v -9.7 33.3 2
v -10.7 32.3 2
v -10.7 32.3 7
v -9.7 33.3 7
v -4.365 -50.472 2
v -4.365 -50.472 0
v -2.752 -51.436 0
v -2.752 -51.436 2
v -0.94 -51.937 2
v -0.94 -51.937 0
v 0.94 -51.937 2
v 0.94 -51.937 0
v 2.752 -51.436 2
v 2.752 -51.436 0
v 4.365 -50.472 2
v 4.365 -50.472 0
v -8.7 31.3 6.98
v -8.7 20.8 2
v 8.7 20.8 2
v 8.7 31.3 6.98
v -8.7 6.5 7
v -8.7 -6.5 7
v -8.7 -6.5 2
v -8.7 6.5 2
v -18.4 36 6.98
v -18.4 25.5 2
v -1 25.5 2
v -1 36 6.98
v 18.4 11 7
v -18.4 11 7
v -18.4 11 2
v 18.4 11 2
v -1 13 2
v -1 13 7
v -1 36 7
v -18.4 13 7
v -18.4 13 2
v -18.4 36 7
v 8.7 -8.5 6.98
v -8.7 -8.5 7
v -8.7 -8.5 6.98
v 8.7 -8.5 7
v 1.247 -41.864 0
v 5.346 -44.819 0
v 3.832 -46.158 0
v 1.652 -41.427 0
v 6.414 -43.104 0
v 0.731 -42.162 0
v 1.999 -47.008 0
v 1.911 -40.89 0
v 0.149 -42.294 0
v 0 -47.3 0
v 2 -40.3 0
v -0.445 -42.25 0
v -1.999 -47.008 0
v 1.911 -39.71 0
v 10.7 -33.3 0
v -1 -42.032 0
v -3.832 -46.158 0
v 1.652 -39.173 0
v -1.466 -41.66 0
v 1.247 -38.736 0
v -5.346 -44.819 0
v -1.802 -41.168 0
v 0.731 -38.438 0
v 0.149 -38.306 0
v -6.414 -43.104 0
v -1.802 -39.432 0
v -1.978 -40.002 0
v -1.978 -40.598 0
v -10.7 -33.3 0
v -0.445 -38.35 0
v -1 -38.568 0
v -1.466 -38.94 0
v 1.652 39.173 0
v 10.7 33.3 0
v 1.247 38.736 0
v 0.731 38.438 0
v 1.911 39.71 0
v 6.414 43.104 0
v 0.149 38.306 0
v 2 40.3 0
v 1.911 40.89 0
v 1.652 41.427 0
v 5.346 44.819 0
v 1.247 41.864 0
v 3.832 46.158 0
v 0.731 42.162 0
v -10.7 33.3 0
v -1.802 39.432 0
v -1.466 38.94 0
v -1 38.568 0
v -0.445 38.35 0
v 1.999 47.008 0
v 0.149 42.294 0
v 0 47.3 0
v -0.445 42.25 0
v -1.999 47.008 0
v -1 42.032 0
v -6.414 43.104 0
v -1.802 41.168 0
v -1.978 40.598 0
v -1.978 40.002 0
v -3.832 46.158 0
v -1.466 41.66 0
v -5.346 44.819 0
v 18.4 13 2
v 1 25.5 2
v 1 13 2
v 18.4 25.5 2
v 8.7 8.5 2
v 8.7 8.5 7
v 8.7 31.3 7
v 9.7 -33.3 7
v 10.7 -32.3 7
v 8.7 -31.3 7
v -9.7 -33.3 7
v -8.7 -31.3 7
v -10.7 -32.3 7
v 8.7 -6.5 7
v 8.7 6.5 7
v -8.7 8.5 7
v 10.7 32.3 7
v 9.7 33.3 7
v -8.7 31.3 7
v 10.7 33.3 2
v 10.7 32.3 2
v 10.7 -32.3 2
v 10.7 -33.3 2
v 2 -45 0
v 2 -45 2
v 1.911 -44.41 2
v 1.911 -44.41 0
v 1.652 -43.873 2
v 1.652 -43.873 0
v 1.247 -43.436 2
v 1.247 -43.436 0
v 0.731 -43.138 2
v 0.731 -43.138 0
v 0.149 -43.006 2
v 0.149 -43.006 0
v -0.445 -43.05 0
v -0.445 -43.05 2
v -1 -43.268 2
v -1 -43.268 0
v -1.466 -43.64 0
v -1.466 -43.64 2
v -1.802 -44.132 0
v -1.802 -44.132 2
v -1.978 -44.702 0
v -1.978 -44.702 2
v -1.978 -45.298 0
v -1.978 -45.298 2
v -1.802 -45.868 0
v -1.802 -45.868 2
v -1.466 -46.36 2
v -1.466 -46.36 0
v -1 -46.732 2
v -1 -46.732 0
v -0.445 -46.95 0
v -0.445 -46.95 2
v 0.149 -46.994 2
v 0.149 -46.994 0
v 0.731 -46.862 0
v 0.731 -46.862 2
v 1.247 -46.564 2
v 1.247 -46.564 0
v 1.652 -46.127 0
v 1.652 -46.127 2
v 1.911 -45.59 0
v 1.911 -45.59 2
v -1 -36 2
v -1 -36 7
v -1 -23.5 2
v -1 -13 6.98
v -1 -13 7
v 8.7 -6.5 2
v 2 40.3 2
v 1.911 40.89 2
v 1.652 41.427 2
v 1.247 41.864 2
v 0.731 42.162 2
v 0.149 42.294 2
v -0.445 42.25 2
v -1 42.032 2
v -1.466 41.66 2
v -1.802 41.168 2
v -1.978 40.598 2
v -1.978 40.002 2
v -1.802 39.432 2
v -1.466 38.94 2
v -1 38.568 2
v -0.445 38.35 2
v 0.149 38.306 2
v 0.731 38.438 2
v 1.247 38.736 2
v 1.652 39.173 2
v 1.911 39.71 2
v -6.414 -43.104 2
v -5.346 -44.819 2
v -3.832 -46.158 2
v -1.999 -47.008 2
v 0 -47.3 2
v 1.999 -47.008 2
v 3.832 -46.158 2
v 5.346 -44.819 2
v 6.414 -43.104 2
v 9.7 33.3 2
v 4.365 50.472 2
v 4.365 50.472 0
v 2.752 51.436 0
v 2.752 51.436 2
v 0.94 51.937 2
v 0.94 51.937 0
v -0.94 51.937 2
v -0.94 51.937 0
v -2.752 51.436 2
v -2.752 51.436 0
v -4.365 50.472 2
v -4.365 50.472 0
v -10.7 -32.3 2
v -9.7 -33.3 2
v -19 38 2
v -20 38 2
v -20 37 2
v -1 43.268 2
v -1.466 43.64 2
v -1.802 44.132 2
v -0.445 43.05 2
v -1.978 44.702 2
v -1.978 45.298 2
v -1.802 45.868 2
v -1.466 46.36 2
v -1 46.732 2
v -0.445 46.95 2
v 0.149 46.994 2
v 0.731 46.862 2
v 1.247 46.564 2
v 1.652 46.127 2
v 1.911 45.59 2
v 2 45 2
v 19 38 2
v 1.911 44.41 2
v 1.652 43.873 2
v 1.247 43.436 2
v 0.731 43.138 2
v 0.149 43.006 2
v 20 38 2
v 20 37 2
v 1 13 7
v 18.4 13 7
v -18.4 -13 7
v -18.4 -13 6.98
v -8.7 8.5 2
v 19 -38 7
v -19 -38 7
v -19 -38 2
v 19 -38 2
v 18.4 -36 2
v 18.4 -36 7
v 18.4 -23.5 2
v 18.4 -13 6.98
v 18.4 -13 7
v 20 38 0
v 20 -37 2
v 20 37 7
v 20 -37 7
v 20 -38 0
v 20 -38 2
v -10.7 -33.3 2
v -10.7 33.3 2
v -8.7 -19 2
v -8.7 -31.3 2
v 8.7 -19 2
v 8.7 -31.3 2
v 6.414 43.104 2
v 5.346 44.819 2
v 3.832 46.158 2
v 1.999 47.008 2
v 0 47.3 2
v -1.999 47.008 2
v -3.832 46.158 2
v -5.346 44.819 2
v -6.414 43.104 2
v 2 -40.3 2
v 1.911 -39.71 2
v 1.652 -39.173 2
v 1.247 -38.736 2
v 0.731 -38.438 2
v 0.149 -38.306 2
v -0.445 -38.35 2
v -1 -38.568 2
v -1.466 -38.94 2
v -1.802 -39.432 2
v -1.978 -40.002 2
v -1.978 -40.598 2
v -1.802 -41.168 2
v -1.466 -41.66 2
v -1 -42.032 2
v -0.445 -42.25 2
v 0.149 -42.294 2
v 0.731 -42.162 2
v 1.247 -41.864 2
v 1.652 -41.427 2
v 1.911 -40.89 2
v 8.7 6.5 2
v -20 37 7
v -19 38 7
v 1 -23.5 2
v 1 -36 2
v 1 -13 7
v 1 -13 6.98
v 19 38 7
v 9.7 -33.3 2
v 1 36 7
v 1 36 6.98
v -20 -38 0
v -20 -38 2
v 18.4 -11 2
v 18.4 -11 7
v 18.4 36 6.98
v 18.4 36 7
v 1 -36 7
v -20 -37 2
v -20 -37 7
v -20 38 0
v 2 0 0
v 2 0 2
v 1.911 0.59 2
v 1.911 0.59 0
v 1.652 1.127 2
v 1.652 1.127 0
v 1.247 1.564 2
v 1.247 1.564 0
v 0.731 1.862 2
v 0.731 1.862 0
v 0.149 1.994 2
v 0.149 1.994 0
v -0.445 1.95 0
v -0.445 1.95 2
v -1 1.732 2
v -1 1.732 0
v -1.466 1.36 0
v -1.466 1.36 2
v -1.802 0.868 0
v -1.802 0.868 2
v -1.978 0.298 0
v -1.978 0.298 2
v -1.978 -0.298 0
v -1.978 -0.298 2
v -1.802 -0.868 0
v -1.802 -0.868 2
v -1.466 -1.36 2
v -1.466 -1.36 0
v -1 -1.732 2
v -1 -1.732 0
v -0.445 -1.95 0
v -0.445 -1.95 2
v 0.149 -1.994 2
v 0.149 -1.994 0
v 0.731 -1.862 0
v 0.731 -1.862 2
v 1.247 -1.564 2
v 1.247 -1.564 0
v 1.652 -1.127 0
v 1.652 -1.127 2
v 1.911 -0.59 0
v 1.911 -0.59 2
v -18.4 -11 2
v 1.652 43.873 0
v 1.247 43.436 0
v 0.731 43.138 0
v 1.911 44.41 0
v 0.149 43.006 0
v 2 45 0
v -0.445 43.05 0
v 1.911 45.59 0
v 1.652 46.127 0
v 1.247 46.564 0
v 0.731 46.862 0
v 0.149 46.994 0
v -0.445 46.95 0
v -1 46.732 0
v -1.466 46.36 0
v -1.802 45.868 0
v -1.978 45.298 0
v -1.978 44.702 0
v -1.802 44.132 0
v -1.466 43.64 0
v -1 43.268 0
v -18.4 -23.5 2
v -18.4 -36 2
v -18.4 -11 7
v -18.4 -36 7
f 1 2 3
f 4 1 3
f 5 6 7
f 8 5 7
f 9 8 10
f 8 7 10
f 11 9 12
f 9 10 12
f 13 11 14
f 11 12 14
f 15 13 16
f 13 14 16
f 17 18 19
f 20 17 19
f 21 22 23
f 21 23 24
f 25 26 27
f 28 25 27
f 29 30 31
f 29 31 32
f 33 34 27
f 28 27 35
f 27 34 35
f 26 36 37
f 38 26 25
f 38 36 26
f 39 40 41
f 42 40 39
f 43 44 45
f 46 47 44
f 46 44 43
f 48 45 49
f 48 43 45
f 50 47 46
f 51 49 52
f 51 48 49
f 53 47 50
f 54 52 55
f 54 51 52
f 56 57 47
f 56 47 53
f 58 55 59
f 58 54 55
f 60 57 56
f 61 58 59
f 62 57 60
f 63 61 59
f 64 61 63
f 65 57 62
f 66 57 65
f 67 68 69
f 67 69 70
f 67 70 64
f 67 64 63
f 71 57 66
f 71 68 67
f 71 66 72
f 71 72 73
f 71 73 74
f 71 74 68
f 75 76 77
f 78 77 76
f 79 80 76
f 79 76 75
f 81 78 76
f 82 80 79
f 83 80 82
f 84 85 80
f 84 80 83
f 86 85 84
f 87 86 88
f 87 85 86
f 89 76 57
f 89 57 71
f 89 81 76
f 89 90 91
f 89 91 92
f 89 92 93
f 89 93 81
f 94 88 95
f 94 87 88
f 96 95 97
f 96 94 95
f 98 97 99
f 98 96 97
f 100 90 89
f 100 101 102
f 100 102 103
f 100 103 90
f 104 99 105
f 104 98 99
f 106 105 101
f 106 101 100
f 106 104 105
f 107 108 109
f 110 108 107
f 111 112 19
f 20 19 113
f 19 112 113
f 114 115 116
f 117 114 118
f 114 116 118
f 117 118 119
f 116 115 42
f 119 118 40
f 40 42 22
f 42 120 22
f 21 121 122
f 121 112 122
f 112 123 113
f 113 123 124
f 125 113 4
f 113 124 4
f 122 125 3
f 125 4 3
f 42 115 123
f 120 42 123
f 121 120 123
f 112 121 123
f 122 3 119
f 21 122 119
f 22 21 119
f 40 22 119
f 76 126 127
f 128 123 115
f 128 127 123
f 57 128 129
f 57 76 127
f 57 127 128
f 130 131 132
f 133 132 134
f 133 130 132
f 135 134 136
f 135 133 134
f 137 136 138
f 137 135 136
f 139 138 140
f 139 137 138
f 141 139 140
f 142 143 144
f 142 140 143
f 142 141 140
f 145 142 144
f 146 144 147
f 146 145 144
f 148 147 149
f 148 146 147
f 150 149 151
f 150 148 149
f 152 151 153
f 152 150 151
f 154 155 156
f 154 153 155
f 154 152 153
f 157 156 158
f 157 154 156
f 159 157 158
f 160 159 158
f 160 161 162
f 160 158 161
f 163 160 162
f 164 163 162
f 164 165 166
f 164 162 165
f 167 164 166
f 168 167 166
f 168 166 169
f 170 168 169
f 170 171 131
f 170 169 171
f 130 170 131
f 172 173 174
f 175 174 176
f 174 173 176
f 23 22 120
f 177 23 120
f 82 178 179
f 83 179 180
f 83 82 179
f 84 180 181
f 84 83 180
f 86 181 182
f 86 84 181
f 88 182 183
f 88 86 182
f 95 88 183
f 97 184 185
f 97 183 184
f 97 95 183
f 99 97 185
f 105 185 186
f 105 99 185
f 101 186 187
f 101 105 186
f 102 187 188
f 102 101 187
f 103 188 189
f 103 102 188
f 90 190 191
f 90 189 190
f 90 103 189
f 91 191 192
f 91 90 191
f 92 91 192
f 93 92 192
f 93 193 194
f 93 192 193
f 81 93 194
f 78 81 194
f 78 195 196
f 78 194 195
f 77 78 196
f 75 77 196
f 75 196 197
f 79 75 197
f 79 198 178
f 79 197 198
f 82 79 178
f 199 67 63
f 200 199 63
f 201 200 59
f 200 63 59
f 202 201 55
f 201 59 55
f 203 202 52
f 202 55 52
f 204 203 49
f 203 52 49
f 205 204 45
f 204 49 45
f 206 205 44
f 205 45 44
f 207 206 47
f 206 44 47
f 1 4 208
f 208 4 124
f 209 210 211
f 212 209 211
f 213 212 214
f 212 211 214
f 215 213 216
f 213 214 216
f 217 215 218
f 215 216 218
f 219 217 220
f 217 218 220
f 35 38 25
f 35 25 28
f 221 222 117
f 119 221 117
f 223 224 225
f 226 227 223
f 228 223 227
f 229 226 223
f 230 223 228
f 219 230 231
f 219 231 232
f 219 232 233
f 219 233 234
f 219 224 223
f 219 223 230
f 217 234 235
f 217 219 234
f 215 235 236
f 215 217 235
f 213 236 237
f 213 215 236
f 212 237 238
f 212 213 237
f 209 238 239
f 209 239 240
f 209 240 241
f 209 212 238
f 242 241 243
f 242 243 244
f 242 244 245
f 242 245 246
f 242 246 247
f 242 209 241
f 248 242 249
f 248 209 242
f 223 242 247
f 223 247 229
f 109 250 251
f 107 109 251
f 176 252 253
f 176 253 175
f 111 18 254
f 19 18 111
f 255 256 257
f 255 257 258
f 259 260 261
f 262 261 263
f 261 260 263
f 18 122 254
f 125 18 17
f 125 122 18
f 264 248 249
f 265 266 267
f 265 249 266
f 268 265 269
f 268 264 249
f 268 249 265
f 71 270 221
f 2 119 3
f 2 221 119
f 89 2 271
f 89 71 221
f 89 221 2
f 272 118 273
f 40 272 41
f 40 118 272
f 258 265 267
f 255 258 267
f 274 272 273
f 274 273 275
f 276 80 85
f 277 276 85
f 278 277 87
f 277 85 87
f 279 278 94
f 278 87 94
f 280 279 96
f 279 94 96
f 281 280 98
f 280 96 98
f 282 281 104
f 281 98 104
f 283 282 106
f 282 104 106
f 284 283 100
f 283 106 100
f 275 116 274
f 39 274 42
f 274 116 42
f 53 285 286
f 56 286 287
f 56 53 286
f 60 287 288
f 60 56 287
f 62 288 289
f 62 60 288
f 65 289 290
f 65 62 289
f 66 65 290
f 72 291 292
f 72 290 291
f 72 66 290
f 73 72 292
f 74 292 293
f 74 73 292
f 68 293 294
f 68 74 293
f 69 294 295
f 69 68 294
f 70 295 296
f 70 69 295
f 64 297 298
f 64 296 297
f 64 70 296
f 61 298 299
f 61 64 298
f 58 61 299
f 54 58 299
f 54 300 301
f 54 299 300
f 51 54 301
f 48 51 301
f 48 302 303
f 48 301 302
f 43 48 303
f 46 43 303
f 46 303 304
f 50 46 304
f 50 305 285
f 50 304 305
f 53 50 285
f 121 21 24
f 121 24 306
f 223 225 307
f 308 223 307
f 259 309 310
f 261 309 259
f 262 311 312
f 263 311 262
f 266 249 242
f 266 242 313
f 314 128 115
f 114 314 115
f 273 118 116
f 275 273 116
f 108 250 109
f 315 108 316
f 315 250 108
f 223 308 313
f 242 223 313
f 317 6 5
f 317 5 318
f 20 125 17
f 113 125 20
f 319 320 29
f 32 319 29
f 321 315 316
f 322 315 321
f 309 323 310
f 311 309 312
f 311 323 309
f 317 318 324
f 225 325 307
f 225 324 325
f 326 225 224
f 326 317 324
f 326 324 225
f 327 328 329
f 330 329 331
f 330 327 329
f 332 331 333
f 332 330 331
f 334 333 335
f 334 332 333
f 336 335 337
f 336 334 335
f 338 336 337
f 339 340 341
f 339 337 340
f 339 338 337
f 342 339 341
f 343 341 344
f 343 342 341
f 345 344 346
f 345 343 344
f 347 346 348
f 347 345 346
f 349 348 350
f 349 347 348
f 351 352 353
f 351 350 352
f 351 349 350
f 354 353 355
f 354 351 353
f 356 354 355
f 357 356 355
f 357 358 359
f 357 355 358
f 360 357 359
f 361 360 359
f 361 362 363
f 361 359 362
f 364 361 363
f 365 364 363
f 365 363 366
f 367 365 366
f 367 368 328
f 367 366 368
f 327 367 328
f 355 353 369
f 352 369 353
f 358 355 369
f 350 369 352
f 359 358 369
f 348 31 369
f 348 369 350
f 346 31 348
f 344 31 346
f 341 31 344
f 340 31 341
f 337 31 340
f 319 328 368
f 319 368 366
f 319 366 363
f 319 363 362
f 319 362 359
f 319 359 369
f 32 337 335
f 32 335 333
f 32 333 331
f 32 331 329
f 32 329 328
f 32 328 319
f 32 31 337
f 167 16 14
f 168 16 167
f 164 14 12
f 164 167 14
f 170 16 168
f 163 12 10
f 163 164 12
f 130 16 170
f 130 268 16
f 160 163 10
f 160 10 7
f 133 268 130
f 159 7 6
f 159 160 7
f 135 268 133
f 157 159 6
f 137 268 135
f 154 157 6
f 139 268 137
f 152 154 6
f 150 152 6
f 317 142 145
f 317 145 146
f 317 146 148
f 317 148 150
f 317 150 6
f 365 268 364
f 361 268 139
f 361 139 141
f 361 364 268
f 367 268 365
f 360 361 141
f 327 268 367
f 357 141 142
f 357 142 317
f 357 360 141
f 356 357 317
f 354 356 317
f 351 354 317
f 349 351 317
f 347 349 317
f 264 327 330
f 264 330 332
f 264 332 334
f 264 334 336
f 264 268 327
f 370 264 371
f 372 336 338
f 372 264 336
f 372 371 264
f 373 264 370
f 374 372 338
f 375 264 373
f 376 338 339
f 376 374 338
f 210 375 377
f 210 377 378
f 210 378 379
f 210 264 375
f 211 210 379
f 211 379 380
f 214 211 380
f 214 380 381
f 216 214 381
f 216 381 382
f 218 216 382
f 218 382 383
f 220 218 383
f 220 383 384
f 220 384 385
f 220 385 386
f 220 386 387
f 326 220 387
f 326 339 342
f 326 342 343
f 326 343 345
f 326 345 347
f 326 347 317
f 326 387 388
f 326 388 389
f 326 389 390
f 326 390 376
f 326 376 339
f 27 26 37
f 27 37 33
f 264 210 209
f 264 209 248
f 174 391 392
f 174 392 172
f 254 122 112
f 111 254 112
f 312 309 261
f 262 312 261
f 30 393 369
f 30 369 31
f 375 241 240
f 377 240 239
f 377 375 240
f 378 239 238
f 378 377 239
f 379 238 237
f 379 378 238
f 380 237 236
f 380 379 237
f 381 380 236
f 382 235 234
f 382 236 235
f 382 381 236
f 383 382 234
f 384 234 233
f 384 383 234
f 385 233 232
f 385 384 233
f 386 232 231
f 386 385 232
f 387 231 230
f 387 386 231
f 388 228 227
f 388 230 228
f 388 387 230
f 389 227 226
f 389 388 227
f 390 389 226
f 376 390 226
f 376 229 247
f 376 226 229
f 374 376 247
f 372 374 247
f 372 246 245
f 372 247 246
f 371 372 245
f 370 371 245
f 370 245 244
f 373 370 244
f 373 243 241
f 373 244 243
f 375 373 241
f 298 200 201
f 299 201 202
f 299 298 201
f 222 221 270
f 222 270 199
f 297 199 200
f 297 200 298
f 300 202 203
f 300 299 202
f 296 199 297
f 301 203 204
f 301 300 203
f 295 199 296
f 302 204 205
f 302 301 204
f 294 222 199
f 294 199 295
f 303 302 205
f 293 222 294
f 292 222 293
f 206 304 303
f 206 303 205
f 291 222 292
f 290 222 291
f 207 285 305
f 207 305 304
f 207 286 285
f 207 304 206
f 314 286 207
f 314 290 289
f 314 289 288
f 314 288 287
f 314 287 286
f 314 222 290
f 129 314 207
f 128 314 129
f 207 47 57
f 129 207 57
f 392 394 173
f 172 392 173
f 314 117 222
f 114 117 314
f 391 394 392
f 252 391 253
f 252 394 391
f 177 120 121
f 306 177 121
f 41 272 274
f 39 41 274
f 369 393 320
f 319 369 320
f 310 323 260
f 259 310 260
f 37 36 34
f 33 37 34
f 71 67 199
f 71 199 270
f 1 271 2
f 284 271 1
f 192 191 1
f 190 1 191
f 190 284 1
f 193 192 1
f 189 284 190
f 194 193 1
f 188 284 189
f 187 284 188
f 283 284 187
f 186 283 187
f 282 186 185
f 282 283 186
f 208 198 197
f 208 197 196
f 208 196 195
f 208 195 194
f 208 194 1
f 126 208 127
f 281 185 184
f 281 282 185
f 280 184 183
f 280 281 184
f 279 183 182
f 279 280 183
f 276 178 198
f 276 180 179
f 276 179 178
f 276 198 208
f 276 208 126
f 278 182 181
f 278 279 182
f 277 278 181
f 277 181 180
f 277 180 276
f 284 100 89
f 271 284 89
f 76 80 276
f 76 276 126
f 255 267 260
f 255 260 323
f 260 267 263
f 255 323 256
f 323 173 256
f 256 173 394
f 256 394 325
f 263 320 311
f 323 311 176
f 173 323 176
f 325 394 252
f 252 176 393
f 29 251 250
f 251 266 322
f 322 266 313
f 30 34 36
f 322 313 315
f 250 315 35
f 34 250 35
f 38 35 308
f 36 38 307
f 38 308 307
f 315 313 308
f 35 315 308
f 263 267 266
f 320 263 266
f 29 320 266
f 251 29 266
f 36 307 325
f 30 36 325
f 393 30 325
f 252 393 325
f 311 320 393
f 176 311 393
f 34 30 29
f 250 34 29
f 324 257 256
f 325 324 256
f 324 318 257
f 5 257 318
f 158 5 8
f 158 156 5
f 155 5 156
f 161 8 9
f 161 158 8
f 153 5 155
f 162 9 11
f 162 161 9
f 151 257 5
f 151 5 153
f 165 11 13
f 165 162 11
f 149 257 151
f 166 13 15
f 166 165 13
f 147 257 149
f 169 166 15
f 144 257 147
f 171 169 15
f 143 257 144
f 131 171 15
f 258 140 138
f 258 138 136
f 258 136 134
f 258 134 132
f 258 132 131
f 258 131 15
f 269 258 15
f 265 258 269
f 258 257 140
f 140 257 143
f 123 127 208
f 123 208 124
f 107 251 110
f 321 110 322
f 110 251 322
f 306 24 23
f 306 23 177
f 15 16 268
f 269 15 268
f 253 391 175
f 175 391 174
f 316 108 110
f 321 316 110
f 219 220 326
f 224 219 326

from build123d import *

# Parameters (mm, degrees)
SKETCH_R           = 2
PAD_DEPTH          = 7
SKETCH001_W        = 17.4
SKETCH001_H        = 23
SKETCH001_W_2      = 40
SKETCH001_H_2      = 14
SKETCH001_W_3      = 36.8
SKETCH001_H_3      = 22
POCKET_DEPTH       = 5
CHAMFER_1_SIZE2    = 10.5
CHAMFER_1_SIZE     = 4.98
CHAMFER_2_SIZE2    = 10.5
CHAMFER_2_SIZE     = 4.98
CHAMFER_3_SIZE2    = 10.5
CHAMFER_3_SIZE     = 4.98
CHAMFER_4_SIZE2    = 10.5
CHAMFER_4_SIZE     = 4.98
CHAMFER001_SIZE    = 1
SKETCH002_R        = 2
PAD001_DEPTH       = 7
SKETCH003_W        = 21.4
SKETCH003_H        = 14
SKETCH003_W_2      = 17.4
SKETCH003_H_2      = 22.8
SKETCH003_H_3      = 13
POCKET001_DEPTH    = 5
CHAMFER002_1_SIZE2 = 10.5
CHAMFER002_1_SIZE  = 4.98
CHAMFER002_2_SIZE2 = 10.5
CHAMFER002_2_SIZE  = 4.98
CHAMFER003_SIZE    = 1


with BuildPart() as f_4x_3er:
    # Sketch → Pad (new body)
    with BuildSketch(Plane.XY):
        with BuildLine():
            Line((20, 38), (20, -38))
            Line((4.365256, -50.47216), (20, -38))
            ThreePointArc((-4.365256, -50.47216), (0, -52), (4.365256, -50.47216))
            Line((-4.365256, -50.47216), (-20, -38))
            Line((-20, -38), (-20, 38))
            Line((-4.365256, 50.47216), (-20, 38))
            ThreePointArc((4.365256, 50.47216), (0, 52), (-4.365256, 50.47216))
            Line((4.365256, 50.47216), (20, 38))
        make_face()
        with Locations((0, -45)):
            Circle(SKETCH_R, mode=Mode.SUBTRACT)
        with Locations((0, 45)):
            Circle(SKETCH_R, mode=Mode.SUBTRACT)
        Circle(SKETCH_R, mode=Mode.SUBTRACT)
    extrude(amount=PAD_DEPTH)

    # Sketch001 → Pocket (cut)
    with BuildSketch(Plane.XY.offset(7)):
        with Locations((-9.7, -24.5)):
            Rectangle(SKETCH001_W, SKETCH001_H)
        with Locations((9.7, -24.5)):
            Rectangle(SKETCH001_W, SKETCH001_H)
        with Locations((0, 45)):
            Rectangle(SKETCH001_W_2, SKETCH001_H_2)
        with Locations((0, -45)):
            Rectangle(SKETCH001_W_2, SKETCH001_H_2)
        with Locations((-9.7, 24.5)):
            Rectangle(SKETCH001_W, SKETCH001_H)
        with Locations((9.7, 24.5)):
            Rectangle(SKETCH001_W, SKETCH001_H)
        Rectangle(SKETCH001_W_3, SKETCH001_H_3)
    extrude(amount=-POCKET_DEPTH, mode=Mode.SUBTRACT)

    # Chamfer 1
    chamfer_1_edges = [f_4x_3er.edges().sort_by_distance(p)[0] for p in [
        (-9.7, -13, 2),
    ]]
    chamfer_1_side = f_4x_3er.faces().sort_by_distance((-9.7, -13, 4.5))[0]
    chamfer(chamfer_1_edges, length=CHAMFER_1_SIZE, length2=CHAMFER_1_SIZE2, reference=chamfer_1_side)

    # Chamfer 2
    chamfer_2_edges = [f_4x_3er.edges().sort_by_distance(p)[0] for p in [
        (9.7, -13, 2),
    ]]
    chamfer_2_side = f_4x_3er.faces().sort_by_distance((9.7, -13, 4.5))[0]
    chamfer(chamfer_2_edges, length=CHAMFER_2_SIZE, length2=CHAMFER_2_SIZE2, reference=chamfer_2_side)

    # Chamfer 3
    chamfer_3_edges = [f_4x_3er.edges().sort_by_distance(p)[0] for p in [
        (9.7, 36, 2),
    ]]
    chamfer_3_side = f_4x_3er.faces().sort_by_distance((9.7, 36, 4.5))[0]
    chamfer(chamfer_3_edges, length=CHAMFER_3_SIZE, length2=CHAMFER_3_SIZE2, reference=chamfer_3_side)

    # Chamfer 4
    chamfer_4_edges = [f_4x_3er.edges().sort_by_distance(p)[0] for p in [
        (-9.7, 36, 2),
    ]]
    chamfer_4_side = f_4x_3er.faces().sort_by_distance((-9.7, 36, 4.5))[0]
    chamfer(chamfer_4_edges, length=CHAMFER_4_SIZE, length2=CHAMFER_4_SIZE2, reference=chamfer_4_side)

    # Chamfer001
    chamfer001_edges = [f_4x_3er.edges().sort_by_distance(p)[0] for p in [
        (-20, 38, 4.5),
        (20, 38, 4.5),
        (20, -38, 4.5),
        (-20, -38, 4.5),
    ]]
    chamfer(chamfer001_edges, length=CHAMFER001_SIZE)


with BuildPart() as f_2x_3er:
    # Sketch002 → Pad001 (new body)
    with BuildSketch(Plane.XY):
        with BuildLine():
            Line((10.7, 33.3), (10.7, -33.3))
            Line((6.413848, -43.104025), (10.7, -33.3))
            ThreePointArc((-6.413848, -43.104025), (0, -47.3), (6.413848, -43.104025))
            Line((-6.413848, -43.104025), (-10.7, -33.3))
            Line((-10.7, -33.3), (-10.7, 33.3))
            Line((-6.413848, 43.104025), (-10.7, 33.3))
            ThreePointArc((6.413848, 43.104025), (0, 47.3), (-6.413848, 43.104025))
            Line((6.413848, 43.104025), (10.7, 33.3))
        make_face()
        with Locations((0, 40.3)):
            Circle(SKETCH002_R, mode=Mode.SUBTRACT)
        with Locations((0, -40.3)):
            Circle(SKETCH002_R, mode=Mode.SUBTRACT)
    extrude(amount=PAD001_DEPTH)

    # Sketch003 → Pocket001 (cut)
    with BuildSketch(Plane.XY.offset(7)):
        with Locations((0, 40.3)):
            Rectangle(SKETCH003_W, SKETCH003_H)
        with Locations((0, -40.3)):
            Rectangle(SKETCH003_W, SKETCH003_H)
        with Locations((0, 19.9)):
            Rectangle(SKETCH003_W_2, SKETCH003_H_2)
        with Locations((0, -19.9)):
            Rectangle(SKETCH003_W_2, SKETCH003_H_2)
        Rectangle(SKETCH003_W_2, SKETCH003_H_3)
    extrude(amount=-POCKET001_DEPTH, mode=Mode.SUBTRACT)

    # Chamfer002 1
    chamfer002_1_edges = [f_2x_3er.edges().sort_by_distance(p)[0] for p in [
        (0, -8.5, 2),
    ]]
    chamfer002_1_side = f_2x_3er.faces().sort_by_distance((0, -8.5, 4.5))[0]
    chamfer(chamfer002_1_edges, length=CHAMFER002_1_SIZE, length2=CHAMFER002_1_SIZE2, reference=chamfer002_1_side)

    # Chamfer002 2
    chamfer002_2_edges = [f_2x_3er.edges().sort_by_distance(p)[0] for p in [
        (0, 31.3, 2),
    ]]
    chamfer002_2_side = f_2x_3er.faces().sort_by_distance((0, 31.3, 4.5))[0]
    chamfer(chamfer002_2_edges, length=CHAMFER002_2_SIZE, length2=CHAMFER002_2_SIZE2, reference=chamfer002_2_side)

    # Chamfer003
    chamfer003_edges = [f_2x_3er.edges().sort_by_distance(p)[0] for p in [
        (10.7, -33.3, 4.5),
        (-10.7, -33.3, 4.5),
        (10.7, 33.3, 4.5),
        (-10.7, 33.3, 4.5),
    ]]
    chamfer(chamfer003_edges, length=CHAMFER003_SIZE)


solid = Compound([f_4x_3er.part, f_2x_3er.part])
